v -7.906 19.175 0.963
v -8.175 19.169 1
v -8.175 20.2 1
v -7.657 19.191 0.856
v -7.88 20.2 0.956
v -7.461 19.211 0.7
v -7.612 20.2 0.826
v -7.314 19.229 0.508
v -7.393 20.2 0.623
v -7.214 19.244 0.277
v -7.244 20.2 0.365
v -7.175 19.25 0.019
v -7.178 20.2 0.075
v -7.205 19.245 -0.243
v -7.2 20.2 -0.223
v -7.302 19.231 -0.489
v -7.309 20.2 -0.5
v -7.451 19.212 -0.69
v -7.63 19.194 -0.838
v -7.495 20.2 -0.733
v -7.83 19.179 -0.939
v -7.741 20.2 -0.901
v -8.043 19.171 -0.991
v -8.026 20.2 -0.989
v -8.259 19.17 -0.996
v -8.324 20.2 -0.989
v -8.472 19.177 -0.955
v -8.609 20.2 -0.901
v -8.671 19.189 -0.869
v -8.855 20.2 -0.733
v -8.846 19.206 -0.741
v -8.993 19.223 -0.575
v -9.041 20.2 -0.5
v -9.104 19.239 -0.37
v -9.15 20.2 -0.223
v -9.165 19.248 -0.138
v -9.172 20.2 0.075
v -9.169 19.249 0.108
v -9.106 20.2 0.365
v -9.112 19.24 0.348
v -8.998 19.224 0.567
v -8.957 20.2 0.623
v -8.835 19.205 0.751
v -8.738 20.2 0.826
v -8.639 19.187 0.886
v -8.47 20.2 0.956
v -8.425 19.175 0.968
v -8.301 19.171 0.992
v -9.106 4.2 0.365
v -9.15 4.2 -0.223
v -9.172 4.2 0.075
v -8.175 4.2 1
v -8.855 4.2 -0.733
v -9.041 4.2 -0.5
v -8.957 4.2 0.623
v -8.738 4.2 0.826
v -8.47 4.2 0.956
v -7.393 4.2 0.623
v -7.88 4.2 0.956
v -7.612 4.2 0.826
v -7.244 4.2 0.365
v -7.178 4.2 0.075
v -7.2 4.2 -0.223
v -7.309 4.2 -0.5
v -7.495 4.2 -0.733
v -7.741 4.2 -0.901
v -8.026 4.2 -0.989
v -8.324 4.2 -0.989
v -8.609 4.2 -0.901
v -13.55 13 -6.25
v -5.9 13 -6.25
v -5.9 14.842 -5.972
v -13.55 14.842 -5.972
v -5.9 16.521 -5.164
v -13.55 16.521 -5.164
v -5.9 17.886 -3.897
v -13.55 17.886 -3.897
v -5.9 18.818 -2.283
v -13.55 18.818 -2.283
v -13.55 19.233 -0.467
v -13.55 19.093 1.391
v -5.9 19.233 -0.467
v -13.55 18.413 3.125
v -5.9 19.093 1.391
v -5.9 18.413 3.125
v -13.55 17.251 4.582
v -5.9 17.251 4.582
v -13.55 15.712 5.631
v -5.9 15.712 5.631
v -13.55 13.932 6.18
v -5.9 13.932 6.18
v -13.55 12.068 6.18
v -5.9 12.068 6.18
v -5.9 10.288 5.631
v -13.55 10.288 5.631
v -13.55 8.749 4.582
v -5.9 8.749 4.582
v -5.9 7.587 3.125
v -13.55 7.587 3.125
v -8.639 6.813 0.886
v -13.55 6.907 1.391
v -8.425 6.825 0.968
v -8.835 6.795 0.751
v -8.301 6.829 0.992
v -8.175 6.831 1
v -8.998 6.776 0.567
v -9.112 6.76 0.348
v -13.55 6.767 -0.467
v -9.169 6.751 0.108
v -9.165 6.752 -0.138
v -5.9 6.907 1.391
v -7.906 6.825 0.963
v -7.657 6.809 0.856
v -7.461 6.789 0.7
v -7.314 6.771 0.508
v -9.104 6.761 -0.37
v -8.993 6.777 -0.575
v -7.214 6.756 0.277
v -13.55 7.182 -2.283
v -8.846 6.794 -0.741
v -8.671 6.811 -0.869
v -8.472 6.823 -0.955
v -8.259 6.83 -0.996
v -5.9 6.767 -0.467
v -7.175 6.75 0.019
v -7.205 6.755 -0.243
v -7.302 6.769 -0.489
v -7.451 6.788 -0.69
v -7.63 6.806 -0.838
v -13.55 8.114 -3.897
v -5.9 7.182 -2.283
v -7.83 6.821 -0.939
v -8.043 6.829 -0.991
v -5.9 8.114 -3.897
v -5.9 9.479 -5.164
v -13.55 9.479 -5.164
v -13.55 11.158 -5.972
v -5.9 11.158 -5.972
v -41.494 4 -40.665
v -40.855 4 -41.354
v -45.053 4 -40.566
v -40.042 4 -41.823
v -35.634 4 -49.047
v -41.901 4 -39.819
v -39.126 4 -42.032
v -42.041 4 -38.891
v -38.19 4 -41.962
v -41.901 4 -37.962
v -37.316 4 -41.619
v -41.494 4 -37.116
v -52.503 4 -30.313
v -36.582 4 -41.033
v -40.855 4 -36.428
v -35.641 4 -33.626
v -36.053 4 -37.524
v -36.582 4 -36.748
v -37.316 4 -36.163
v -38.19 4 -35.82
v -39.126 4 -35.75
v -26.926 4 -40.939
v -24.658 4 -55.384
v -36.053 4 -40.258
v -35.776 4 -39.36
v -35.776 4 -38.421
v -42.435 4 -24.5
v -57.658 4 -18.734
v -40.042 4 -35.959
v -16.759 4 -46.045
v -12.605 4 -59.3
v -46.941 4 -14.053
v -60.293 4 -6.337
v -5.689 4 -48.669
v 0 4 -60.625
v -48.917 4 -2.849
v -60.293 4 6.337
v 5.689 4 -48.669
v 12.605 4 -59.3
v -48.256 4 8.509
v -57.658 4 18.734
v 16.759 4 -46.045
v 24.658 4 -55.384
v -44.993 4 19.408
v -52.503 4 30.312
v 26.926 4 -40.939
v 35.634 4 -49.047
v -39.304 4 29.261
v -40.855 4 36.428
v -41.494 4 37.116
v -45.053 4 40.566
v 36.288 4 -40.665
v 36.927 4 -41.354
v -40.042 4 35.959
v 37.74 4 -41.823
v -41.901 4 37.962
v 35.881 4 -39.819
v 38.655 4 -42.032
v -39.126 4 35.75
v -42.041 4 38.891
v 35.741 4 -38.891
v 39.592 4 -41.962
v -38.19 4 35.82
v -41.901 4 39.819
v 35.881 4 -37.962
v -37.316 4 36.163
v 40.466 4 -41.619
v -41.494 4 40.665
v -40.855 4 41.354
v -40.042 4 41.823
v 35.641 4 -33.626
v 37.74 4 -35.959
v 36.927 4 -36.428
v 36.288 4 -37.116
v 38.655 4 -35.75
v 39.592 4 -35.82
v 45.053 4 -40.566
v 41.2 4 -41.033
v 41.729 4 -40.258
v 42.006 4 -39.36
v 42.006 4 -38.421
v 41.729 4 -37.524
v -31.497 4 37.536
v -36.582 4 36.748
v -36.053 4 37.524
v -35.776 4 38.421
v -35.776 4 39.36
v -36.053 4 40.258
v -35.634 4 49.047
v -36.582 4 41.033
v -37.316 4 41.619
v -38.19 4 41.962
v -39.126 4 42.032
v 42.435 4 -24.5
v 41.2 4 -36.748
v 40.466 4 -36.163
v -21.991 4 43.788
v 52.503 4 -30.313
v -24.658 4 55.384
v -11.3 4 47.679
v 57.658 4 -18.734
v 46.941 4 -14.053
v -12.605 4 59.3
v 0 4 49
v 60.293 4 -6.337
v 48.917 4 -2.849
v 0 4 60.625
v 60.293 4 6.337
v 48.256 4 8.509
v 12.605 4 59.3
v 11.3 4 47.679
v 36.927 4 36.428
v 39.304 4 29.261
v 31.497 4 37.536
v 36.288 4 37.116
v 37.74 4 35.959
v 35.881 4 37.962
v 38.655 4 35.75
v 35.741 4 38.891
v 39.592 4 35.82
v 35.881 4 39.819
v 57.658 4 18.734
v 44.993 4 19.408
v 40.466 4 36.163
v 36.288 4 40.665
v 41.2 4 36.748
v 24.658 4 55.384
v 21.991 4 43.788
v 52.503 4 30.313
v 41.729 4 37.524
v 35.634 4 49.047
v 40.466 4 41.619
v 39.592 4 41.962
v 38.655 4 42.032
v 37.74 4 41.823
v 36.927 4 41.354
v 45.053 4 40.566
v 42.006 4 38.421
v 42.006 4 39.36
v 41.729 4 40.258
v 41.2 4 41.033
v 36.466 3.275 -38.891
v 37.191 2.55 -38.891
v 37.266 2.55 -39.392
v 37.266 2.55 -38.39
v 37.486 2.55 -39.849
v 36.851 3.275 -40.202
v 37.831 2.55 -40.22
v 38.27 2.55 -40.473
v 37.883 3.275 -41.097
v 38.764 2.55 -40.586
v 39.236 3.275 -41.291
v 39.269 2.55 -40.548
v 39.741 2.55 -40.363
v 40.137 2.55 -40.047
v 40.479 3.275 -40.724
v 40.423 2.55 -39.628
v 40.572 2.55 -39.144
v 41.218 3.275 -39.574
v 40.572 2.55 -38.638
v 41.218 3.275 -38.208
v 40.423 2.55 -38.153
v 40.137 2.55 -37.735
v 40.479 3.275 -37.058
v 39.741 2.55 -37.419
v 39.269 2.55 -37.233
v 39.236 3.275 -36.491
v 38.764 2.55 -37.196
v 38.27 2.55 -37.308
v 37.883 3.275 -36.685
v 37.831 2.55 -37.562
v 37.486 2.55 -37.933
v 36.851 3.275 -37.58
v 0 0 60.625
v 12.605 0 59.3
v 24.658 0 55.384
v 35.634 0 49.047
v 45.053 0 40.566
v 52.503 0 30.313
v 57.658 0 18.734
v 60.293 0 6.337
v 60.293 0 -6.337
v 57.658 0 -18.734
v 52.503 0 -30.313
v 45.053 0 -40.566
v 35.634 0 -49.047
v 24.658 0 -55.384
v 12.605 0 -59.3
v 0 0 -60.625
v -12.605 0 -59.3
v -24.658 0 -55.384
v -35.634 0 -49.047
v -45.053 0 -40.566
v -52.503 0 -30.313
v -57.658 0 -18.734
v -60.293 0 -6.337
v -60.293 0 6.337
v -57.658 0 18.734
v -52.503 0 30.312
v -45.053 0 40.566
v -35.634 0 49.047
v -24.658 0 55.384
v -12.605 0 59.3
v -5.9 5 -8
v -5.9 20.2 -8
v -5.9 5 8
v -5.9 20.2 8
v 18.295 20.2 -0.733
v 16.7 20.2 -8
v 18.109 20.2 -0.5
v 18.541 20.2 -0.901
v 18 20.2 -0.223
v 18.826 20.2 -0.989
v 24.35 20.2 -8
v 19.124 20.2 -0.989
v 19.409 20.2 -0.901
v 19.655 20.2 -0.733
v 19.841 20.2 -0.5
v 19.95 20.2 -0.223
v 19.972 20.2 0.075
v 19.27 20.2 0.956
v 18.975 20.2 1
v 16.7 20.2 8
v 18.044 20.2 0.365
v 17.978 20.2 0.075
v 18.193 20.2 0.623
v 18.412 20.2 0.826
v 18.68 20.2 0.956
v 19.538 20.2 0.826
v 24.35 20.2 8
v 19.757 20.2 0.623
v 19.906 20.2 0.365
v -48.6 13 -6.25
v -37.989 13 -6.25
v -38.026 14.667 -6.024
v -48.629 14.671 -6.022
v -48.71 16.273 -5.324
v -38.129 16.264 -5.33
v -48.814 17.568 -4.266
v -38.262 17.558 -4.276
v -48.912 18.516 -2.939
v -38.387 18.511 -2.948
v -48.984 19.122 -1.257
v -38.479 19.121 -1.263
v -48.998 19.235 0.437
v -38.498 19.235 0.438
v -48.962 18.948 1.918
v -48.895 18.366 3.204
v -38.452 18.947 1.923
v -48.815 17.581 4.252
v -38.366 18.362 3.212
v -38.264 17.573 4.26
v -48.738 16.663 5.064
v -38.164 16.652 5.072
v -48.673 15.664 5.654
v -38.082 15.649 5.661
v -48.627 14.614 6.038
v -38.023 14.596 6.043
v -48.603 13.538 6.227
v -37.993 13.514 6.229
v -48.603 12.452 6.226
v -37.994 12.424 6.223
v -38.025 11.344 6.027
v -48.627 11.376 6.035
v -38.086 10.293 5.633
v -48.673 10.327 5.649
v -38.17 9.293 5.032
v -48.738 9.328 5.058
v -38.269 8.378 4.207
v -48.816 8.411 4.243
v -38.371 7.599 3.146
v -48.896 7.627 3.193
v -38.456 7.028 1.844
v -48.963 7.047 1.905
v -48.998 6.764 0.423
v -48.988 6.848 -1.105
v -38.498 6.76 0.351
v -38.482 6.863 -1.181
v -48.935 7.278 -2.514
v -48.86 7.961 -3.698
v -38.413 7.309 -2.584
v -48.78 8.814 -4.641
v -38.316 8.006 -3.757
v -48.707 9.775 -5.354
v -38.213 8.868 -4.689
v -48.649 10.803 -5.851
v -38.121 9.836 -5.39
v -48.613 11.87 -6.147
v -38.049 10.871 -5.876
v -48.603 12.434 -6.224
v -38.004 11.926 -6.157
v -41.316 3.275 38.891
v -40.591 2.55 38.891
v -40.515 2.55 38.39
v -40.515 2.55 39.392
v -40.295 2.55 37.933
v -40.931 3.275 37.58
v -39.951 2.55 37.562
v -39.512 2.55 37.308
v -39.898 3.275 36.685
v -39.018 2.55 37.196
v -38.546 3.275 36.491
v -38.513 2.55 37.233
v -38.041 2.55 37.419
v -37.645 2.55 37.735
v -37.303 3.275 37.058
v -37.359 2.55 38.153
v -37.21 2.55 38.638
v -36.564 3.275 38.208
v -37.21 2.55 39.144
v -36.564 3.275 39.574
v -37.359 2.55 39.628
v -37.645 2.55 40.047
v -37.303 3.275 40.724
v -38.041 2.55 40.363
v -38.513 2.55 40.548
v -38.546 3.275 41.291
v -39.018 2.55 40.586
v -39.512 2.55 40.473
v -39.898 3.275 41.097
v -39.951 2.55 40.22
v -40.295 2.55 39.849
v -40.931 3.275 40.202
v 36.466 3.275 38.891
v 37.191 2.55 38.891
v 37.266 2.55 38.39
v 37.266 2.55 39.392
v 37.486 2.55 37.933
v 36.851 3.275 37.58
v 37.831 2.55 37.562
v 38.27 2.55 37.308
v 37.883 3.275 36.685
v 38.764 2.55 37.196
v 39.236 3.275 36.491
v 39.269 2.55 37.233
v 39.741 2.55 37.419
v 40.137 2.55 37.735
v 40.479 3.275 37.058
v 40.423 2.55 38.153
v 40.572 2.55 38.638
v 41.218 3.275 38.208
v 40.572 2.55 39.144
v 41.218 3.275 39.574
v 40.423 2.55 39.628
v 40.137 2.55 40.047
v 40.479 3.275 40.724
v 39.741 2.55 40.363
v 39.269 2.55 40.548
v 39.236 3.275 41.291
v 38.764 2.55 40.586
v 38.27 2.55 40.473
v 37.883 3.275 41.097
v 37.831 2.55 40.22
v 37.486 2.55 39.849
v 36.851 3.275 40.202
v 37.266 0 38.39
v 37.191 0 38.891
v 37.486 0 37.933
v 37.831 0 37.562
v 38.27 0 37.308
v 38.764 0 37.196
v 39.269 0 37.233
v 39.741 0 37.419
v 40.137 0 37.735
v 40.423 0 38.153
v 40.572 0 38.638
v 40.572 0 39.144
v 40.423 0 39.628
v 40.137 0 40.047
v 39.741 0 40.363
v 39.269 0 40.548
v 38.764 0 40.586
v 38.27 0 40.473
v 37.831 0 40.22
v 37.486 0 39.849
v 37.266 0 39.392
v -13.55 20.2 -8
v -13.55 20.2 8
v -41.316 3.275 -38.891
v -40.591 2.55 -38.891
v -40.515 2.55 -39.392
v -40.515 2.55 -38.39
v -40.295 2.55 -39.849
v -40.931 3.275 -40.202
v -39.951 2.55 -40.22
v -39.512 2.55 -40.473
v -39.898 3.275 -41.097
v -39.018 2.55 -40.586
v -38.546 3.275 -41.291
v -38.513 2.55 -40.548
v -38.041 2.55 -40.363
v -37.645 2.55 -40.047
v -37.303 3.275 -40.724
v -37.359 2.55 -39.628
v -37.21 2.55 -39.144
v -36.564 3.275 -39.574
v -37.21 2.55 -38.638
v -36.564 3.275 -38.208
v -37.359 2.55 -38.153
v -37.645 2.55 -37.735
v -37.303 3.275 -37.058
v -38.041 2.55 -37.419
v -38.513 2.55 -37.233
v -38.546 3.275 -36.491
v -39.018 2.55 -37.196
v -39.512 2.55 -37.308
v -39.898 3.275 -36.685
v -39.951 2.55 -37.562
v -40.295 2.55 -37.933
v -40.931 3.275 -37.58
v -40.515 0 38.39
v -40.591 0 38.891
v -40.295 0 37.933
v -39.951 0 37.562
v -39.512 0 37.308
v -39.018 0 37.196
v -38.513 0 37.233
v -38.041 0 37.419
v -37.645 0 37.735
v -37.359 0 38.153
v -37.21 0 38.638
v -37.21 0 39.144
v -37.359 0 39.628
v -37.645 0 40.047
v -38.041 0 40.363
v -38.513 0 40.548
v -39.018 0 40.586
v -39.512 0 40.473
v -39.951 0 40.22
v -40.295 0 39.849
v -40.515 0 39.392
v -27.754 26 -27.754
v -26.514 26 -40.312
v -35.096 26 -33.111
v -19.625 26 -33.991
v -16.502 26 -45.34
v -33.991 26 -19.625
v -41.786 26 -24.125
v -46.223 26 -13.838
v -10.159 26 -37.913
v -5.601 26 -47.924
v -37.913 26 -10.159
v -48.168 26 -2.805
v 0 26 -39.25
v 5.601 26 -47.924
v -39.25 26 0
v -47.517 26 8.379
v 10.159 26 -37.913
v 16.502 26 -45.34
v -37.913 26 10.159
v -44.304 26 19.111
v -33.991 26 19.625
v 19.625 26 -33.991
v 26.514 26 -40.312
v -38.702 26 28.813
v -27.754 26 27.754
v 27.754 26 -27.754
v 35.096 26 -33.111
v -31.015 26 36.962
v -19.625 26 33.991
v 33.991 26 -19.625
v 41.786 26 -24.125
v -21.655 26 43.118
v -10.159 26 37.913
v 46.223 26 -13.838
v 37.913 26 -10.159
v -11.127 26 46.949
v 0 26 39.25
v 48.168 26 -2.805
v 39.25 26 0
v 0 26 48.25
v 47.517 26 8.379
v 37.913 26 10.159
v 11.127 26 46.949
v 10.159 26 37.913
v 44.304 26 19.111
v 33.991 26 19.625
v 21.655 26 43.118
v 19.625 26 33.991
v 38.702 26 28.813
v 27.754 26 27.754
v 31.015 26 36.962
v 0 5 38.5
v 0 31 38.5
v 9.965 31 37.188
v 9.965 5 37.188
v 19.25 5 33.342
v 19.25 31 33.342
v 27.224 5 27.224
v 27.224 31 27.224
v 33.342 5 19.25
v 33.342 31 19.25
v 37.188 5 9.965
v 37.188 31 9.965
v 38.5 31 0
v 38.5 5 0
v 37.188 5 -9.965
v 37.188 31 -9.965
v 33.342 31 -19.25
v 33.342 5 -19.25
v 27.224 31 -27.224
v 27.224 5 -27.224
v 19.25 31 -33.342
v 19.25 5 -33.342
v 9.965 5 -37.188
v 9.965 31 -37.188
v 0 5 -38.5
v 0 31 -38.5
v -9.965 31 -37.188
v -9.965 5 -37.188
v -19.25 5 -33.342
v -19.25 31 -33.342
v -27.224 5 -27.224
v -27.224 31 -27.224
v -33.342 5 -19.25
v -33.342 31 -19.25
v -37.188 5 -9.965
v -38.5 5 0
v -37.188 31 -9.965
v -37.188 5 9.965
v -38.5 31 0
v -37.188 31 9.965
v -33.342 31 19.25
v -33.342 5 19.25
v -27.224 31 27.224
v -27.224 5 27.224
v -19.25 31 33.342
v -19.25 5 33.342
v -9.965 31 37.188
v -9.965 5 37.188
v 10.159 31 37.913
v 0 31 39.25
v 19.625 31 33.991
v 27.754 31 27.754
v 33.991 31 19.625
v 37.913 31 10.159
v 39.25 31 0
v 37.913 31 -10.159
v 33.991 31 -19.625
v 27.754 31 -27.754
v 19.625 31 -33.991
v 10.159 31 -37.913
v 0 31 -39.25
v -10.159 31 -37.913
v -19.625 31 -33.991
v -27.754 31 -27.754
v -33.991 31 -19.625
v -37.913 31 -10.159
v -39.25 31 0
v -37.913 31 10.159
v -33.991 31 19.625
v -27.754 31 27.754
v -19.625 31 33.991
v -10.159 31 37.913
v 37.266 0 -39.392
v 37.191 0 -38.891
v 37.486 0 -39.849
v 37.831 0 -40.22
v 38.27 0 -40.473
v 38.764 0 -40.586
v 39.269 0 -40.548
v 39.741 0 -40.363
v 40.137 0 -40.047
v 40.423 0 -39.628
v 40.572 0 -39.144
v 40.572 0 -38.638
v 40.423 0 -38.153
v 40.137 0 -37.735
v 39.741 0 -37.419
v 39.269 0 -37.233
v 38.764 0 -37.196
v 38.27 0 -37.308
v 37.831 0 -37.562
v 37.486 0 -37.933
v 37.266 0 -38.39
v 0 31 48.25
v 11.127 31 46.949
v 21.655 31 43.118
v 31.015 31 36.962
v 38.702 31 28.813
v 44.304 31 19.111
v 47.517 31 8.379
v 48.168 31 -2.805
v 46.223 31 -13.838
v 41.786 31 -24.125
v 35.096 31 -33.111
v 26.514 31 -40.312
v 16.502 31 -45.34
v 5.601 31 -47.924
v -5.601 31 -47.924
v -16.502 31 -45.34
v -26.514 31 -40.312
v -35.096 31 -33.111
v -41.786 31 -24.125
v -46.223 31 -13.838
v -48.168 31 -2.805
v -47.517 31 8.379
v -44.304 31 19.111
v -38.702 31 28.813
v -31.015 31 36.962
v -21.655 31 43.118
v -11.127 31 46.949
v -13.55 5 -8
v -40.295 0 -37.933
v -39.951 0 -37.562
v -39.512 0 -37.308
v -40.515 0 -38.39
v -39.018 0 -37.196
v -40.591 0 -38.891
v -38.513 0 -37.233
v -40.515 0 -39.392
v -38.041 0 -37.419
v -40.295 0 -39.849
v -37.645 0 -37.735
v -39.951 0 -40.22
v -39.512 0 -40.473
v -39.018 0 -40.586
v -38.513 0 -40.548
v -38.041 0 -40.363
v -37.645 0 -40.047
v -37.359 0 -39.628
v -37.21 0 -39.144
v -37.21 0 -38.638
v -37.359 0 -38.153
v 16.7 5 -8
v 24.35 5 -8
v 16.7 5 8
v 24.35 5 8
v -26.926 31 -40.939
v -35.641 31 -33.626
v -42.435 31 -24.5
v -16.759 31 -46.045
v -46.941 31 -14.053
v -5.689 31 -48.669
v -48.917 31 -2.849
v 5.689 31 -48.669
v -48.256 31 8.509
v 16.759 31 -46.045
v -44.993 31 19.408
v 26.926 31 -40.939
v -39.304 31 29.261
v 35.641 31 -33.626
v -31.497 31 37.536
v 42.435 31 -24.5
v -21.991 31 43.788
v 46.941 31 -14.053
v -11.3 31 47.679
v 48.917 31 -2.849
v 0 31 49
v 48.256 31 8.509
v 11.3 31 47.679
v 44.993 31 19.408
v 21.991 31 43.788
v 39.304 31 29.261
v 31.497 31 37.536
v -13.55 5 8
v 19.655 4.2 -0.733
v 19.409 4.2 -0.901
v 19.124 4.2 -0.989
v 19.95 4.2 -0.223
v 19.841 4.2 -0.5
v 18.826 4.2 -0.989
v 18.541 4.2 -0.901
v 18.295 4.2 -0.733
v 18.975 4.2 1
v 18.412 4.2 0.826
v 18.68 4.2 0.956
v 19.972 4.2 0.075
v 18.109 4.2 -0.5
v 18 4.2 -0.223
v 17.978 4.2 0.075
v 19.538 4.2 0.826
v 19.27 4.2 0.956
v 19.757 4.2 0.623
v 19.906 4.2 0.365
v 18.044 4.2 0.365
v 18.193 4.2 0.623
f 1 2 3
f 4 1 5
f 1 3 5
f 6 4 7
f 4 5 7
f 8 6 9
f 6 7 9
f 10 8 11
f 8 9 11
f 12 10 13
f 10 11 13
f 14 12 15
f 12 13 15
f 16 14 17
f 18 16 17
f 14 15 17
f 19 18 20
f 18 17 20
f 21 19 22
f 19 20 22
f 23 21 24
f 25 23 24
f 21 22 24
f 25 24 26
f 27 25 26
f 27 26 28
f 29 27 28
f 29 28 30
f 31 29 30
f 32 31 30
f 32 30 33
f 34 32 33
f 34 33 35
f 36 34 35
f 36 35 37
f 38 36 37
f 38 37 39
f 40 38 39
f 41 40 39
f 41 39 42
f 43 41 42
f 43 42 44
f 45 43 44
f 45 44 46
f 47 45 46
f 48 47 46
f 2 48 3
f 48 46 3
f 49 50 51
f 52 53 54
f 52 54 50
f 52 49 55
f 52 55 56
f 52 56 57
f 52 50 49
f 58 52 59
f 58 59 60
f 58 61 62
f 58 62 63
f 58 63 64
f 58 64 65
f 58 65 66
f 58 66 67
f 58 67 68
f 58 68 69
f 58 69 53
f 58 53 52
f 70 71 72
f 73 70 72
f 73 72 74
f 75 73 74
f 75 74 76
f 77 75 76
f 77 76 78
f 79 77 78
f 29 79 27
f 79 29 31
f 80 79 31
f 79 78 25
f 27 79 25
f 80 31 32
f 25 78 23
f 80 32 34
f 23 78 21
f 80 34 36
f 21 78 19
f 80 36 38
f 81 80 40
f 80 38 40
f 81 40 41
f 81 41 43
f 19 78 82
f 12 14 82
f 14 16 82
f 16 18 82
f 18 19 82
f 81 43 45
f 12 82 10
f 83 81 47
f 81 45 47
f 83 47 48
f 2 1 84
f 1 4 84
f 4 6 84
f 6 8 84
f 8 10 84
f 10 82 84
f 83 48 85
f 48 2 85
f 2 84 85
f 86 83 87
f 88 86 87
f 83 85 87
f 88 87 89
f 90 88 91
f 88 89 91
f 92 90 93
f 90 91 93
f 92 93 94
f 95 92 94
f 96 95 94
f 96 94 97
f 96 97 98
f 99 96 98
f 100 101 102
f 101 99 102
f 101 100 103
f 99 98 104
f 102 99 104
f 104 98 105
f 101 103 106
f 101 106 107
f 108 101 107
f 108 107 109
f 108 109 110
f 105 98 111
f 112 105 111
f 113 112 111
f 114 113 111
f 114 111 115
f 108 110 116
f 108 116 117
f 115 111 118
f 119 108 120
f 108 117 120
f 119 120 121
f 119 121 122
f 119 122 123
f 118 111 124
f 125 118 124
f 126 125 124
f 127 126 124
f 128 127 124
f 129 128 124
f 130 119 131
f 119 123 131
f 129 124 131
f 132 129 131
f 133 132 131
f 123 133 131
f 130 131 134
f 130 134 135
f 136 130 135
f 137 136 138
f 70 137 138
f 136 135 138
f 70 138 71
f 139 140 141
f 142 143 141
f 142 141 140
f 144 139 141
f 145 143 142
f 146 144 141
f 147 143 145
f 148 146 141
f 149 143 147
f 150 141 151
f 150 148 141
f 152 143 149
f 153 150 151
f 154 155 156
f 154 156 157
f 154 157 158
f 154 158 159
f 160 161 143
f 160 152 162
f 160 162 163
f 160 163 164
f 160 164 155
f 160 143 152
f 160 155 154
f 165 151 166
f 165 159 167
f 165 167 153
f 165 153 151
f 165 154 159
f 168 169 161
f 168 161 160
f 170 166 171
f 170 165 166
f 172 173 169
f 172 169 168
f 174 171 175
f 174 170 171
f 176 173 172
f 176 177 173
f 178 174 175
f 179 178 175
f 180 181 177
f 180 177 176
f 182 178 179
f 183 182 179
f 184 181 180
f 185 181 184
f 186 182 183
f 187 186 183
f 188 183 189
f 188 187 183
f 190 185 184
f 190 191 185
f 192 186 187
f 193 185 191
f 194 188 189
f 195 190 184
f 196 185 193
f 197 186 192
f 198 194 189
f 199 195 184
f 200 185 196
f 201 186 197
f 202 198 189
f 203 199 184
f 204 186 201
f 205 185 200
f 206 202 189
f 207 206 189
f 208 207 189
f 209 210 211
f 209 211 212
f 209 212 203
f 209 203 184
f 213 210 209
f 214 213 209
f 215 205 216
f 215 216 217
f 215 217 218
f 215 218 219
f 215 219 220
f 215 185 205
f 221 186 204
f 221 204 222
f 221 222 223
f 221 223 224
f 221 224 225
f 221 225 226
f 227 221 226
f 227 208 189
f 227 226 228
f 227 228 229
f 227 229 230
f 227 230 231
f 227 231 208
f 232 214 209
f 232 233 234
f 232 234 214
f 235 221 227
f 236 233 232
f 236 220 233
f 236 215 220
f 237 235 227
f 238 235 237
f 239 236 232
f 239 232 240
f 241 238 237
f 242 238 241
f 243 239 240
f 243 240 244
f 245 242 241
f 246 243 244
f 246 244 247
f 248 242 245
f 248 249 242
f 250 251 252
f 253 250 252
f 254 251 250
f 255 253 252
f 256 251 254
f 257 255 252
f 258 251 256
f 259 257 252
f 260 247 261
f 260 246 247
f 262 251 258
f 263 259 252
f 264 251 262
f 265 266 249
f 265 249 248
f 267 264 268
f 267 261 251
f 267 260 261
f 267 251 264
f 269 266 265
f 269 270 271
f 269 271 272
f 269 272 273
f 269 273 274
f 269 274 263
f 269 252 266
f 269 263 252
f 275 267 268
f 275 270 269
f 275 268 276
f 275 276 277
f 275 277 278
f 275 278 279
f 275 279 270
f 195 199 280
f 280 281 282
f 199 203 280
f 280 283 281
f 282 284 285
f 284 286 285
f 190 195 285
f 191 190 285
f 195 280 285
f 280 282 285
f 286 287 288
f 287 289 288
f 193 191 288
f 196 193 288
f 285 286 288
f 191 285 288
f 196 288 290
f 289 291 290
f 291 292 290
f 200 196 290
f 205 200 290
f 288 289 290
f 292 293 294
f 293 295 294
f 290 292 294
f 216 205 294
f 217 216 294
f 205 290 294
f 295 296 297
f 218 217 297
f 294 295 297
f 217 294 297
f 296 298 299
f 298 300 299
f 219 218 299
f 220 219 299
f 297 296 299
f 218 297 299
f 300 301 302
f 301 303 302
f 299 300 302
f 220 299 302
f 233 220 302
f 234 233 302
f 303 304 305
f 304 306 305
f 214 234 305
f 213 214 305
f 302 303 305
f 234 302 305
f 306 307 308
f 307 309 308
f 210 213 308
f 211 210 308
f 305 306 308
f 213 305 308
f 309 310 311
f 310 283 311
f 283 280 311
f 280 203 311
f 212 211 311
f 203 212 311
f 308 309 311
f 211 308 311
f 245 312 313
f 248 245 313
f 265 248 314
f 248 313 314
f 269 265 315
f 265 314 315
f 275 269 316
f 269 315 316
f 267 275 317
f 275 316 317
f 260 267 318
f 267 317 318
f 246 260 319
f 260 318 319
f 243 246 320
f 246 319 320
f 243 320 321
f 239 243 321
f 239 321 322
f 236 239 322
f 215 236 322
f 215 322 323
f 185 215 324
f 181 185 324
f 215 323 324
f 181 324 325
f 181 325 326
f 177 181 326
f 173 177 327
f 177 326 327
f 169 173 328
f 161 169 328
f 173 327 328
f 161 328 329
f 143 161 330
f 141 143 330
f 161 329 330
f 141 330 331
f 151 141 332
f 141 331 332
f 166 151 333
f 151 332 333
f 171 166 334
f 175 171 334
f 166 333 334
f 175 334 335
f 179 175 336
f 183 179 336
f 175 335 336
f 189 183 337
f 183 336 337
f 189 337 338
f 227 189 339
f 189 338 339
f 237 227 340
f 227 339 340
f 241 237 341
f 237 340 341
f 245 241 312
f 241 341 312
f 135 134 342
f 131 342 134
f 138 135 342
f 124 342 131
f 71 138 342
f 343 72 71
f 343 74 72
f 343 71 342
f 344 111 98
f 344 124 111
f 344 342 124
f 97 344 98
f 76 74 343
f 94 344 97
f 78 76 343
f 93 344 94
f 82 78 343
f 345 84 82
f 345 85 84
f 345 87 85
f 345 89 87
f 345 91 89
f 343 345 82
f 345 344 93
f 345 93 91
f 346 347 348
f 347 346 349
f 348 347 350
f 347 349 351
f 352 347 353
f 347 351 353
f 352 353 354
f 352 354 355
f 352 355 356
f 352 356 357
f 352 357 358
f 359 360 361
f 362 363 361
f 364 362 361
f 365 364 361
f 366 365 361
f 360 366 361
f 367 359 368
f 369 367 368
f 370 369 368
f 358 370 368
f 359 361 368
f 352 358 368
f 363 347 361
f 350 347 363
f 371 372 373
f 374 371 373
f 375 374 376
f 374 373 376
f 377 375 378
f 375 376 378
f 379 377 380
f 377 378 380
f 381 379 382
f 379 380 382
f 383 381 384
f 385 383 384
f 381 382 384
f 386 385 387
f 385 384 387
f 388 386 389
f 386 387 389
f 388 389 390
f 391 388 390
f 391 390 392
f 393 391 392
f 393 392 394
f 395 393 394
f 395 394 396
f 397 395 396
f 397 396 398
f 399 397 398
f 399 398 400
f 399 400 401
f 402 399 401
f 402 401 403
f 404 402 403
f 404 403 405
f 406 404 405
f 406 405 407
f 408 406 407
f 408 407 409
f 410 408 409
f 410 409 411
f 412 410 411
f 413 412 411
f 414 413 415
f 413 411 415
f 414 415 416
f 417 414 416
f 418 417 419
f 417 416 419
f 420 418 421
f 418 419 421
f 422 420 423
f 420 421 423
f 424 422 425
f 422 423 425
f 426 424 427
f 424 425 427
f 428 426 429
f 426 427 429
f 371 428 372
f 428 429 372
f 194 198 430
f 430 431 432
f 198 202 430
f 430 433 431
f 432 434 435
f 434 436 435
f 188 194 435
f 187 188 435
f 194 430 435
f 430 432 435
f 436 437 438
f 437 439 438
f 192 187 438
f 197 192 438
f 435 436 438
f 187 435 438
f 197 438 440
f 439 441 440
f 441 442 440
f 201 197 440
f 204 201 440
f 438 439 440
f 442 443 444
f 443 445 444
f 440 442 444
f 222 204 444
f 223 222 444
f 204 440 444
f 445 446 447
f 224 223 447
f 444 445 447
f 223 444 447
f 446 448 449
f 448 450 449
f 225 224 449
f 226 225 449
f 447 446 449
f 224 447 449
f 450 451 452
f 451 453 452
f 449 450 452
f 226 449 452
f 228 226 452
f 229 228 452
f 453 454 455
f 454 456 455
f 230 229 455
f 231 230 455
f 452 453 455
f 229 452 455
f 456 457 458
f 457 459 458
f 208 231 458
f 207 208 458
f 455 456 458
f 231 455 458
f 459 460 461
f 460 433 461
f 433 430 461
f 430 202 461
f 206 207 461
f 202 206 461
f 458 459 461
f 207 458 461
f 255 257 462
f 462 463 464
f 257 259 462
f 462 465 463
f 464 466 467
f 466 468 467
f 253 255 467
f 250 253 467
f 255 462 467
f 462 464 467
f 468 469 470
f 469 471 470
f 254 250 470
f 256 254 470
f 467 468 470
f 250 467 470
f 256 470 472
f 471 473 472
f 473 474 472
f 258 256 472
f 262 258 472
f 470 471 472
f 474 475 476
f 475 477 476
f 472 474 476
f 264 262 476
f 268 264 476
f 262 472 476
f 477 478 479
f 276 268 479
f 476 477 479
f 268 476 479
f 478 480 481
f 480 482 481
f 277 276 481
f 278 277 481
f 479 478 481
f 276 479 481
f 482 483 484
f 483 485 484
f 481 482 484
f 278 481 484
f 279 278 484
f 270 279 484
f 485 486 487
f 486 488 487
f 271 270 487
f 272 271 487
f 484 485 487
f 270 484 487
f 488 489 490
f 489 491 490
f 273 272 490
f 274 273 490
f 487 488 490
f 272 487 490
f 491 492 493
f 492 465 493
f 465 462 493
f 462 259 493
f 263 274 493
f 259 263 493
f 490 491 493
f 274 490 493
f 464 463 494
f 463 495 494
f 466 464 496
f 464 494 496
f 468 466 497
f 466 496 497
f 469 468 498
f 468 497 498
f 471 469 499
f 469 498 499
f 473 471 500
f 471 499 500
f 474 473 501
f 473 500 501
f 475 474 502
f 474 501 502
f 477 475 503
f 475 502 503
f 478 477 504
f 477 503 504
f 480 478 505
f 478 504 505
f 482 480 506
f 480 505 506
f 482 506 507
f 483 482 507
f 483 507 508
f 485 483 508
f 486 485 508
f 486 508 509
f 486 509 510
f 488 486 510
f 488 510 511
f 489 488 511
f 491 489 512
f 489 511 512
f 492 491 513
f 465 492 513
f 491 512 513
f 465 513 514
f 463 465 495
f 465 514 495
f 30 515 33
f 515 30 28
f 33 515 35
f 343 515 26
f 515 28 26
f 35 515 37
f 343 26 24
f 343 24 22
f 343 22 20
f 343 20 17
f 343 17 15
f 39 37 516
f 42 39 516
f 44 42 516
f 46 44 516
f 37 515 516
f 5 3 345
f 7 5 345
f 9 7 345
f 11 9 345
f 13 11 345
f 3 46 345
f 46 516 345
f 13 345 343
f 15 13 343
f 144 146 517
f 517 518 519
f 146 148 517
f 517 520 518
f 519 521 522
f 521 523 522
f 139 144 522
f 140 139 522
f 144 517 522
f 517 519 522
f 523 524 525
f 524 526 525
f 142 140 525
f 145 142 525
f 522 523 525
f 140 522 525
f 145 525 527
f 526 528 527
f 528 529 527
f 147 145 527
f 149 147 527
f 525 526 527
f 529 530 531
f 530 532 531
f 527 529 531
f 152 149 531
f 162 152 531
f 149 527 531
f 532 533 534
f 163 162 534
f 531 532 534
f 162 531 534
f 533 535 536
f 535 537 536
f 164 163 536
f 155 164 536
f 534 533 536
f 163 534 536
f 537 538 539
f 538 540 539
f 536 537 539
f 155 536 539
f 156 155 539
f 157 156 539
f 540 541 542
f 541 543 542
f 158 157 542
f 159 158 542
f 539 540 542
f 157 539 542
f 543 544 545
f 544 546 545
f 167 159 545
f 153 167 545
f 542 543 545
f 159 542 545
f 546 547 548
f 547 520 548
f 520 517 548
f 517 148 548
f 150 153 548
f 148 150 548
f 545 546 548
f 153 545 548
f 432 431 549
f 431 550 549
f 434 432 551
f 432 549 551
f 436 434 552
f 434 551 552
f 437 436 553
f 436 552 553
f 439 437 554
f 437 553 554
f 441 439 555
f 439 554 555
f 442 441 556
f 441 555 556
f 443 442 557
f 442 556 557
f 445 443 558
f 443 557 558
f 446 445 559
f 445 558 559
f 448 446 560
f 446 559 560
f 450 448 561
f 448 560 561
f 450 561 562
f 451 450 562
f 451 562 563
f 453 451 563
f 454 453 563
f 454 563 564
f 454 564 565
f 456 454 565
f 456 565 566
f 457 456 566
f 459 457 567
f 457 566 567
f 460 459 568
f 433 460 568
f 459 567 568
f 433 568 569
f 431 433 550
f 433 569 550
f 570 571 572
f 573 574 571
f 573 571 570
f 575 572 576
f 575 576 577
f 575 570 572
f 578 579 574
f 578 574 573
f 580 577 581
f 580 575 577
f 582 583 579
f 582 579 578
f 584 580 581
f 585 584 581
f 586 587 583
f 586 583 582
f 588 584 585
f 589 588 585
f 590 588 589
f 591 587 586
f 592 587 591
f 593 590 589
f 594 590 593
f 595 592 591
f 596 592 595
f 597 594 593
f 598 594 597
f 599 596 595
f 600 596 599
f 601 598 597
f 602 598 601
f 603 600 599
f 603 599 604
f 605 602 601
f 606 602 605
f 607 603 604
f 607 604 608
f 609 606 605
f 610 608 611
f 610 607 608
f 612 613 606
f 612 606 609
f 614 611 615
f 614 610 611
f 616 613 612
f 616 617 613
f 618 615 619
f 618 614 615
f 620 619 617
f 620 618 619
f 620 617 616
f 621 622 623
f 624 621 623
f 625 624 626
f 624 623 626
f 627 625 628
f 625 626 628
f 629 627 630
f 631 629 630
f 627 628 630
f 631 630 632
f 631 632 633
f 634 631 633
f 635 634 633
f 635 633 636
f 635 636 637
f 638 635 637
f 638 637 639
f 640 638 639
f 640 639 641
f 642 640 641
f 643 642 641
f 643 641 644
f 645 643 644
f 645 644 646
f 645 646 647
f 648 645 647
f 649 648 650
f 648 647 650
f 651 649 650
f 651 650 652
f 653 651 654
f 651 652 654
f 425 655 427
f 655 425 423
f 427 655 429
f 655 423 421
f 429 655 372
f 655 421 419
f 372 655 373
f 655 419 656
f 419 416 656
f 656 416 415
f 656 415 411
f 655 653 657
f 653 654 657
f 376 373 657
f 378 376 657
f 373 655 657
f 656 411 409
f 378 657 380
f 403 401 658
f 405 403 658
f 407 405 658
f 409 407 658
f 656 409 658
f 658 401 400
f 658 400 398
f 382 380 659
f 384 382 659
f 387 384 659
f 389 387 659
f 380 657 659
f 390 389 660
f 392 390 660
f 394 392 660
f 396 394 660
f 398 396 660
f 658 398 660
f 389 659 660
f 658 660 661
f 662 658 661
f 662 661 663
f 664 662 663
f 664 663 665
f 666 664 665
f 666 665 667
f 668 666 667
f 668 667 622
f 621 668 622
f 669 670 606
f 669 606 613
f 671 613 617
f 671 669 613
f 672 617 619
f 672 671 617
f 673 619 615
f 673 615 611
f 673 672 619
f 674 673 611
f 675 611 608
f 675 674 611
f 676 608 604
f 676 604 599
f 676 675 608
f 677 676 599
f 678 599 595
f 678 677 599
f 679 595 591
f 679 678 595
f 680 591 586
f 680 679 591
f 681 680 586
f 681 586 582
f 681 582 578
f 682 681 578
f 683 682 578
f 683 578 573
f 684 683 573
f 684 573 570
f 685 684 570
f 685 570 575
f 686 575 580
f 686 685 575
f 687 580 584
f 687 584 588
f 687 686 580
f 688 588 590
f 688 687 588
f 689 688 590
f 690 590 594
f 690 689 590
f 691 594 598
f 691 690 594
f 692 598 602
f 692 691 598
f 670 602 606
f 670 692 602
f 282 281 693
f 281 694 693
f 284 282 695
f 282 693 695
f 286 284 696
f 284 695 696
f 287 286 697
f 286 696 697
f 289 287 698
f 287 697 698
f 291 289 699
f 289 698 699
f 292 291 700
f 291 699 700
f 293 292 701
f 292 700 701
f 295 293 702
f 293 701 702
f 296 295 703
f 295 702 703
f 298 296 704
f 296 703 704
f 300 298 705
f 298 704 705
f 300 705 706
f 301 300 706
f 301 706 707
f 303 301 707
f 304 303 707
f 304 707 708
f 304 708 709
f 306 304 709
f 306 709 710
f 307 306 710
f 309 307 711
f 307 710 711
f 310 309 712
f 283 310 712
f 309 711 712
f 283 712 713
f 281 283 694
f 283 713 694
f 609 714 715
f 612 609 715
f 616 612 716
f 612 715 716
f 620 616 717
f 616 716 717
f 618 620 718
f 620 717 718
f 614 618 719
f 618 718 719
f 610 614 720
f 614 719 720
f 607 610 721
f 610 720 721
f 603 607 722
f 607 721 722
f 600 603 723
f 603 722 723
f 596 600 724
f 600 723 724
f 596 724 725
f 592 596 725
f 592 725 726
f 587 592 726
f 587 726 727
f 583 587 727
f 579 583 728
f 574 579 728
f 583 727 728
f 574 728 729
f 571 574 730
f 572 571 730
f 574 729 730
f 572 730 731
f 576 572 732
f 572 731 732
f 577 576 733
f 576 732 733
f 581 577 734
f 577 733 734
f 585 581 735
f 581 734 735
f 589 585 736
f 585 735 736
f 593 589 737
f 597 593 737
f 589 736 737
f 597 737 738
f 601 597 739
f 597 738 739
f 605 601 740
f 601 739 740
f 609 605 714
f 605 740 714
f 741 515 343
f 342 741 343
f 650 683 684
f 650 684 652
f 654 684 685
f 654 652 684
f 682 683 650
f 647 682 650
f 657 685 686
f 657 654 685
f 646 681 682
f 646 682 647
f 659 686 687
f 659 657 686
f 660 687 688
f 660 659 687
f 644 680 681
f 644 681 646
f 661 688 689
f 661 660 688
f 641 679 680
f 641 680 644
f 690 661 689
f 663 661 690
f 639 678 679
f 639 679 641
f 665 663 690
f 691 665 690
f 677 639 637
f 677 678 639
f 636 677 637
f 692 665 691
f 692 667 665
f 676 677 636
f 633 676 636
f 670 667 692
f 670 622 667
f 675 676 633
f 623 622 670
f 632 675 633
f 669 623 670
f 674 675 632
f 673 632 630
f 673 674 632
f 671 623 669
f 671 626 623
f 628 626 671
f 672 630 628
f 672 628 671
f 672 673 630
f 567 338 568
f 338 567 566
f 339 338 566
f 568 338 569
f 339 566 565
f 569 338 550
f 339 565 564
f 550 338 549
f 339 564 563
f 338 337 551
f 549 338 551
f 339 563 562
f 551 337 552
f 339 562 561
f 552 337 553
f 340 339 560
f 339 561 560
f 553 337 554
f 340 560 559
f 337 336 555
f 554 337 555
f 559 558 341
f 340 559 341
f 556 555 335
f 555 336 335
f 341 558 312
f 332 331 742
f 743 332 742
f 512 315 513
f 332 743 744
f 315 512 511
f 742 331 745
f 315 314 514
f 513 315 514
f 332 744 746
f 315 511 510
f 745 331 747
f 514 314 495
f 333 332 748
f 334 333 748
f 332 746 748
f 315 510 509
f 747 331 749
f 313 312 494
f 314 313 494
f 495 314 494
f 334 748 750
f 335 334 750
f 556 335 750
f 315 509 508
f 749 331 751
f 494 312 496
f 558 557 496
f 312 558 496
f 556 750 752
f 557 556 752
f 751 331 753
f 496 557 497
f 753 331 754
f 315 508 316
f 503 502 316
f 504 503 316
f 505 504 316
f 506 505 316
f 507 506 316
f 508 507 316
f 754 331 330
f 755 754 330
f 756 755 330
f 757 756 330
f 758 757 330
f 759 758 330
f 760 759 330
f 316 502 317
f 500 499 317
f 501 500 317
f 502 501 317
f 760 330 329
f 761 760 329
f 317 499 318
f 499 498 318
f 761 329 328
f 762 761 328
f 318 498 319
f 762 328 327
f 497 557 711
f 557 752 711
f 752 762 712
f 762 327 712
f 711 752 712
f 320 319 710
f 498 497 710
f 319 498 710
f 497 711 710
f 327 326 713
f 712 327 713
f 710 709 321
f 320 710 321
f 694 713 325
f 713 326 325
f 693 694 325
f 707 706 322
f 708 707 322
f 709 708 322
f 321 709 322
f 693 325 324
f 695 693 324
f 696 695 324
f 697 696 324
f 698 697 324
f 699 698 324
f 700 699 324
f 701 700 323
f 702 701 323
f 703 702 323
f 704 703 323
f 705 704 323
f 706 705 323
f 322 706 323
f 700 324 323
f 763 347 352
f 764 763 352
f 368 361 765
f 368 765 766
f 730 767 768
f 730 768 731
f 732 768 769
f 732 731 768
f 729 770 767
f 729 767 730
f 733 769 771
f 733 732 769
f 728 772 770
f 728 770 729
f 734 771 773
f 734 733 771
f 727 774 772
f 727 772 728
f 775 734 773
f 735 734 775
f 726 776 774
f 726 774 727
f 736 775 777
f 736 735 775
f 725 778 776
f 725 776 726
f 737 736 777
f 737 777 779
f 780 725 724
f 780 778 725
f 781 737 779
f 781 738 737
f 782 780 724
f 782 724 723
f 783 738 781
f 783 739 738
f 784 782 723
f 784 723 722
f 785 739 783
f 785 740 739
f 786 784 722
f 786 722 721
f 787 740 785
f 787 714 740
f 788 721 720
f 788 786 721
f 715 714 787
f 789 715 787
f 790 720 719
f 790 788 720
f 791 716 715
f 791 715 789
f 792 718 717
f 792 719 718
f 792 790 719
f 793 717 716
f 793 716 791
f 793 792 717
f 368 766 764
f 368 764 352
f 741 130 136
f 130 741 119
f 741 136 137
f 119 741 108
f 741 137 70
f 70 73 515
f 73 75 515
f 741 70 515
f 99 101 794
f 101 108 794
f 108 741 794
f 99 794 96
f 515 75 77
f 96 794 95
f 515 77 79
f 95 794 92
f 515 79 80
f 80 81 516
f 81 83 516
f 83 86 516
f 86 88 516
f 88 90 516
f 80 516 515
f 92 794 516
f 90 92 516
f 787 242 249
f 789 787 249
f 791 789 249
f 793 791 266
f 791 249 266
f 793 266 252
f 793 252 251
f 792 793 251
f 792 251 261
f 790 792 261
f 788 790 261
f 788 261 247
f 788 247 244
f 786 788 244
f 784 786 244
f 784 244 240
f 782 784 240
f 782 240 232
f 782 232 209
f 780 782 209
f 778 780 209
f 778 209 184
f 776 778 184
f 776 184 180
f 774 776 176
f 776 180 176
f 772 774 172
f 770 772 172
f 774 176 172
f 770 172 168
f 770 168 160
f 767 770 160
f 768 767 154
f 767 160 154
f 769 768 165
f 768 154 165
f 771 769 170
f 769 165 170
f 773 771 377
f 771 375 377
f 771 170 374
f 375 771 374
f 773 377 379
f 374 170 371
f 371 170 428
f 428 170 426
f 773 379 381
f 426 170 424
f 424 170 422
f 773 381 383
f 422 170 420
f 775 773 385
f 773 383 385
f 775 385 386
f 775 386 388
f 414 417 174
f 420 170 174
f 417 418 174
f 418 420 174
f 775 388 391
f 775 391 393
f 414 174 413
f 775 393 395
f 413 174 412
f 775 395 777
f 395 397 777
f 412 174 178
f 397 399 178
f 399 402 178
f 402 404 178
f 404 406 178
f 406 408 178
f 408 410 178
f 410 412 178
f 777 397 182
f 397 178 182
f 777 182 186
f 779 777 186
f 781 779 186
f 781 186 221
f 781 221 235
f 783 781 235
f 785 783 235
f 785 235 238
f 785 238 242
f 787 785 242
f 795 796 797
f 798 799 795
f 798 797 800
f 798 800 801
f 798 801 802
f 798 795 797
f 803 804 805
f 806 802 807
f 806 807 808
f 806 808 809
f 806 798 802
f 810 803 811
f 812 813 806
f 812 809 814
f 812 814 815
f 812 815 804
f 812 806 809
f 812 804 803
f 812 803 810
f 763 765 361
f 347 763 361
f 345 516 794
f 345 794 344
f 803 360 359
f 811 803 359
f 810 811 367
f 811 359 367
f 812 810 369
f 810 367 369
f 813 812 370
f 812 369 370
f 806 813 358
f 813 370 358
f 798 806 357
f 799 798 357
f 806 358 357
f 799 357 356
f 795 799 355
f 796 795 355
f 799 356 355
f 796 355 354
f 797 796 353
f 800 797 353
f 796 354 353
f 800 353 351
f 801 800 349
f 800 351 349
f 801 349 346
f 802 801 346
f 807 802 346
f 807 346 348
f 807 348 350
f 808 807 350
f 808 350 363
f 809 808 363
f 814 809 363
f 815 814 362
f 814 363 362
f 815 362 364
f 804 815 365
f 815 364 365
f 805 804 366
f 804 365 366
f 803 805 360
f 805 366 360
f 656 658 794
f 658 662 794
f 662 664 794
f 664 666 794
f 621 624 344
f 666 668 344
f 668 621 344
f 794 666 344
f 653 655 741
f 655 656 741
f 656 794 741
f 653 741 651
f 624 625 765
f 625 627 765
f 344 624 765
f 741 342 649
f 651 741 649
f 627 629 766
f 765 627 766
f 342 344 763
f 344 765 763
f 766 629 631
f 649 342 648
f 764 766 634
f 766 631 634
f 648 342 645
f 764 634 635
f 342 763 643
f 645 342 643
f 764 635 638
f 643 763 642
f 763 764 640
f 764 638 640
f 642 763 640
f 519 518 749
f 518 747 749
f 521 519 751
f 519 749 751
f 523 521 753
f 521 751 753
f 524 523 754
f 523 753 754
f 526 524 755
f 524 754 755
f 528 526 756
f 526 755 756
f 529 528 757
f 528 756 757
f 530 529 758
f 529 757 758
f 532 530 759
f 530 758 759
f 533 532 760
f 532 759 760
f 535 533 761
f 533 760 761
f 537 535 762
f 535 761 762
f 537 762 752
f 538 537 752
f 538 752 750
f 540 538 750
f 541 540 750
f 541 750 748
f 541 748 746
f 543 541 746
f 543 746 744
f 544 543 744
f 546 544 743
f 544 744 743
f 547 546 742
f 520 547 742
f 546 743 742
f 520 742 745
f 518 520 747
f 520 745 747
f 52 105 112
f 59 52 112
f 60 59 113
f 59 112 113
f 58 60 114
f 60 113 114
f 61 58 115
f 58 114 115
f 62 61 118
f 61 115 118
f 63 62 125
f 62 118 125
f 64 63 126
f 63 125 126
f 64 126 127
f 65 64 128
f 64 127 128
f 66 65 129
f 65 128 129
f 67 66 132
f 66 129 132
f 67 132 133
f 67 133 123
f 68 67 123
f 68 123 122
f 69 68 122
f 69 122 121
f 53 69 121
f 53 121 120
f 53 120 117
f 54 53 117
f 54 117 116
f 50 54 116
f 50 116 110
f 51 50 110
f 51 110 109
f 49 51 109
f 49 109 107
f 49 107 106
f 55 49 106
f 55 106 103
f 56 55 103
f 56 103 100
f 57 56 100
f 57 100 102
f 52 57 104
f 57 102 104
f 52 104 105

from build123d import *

# Parameters (mm, degrees)
SKETCH1_R                                           = 60.625
SKETCH1_R_2                                         = 45
BOSS_EXTRUDE1_DEPTH                                 = 4
SKETCH2_R                                           = 49
SKETCH2_R_2                                         = 45
BOSS_EXTRUDE2_DEPTH                                 = 27
SKETCH4_W                                           = 7.65
SKETCH4_H                                           = 16.2
BOSS_EXTRUDE4_DEPTH                                 = 8
BOSS_EXTRUDE4_2_DEPTH                               = 8
SKETCH5_R                                           = 45
BOSS_EXTRUDE5_DEPTH                                 = 5
SKETCH18_R                                          = 45.113728165
SKETCH18_R_2                                        = 38.5
BOSS_EXTRUDE6_DEPTH                                 = 31
CUT_EXTRUDE8_START                                  = -35
SKETCH11_R                                          = 6.25
CUT_EXTRUDE8_DEPTH                                  = 95.050498837
CSK_FOR_M3_COUNTERSUNK_FLAT_HEAD_SCREW1_D           = 3.4
CSK_FOR_M3_COUNTERSUNK_FLAT_HEAD_SCREW1_CSINK_D     = 6.3
CSK_FOR_M3_COUNTERSUNK_FLAT_HEAD_SCREW1_CSINK_ANGLE = 90
SKETCH27_R                                          = 1
CUT_EXTRUDE11_DEPTH                                 = 16
SKETCH28_R                                          = 48.25
SKETCH28_R_2                                        = 39.25
CUT_EXTRUDE12_DEPTH                                 = 5


with BuildPart() as part:
    # Sketch1 → Boss-Extrude1 (new body)
    with BuildSketch(Plane(origin=(0, 0, 0), x_dir=(1, 0, 0), z_dir=(0, 1, 0))):
        with Locations(Location((0, 0, 0), (0, 0, 270))):
            Circle(SKETCH1_R)
        with Locations(Location((0, 0, 0), (0, 0, 270))):
            Circle(SKETCH1_R_2, mode=Mode.SUBTRACT)
    extrude(amount=BOSS_EXTRUDE1_DEPTH)

    # Sketch2 → Boss-Extrude2 (add)
    with BuildSketch(Plane(origin=(0, 4, 0), x_dir=(1, 0, 0), z_dir=(0, 1, 0))):
        with Locations(Location((0, 0, 0), (0, 0, 270))):
            Circle(SKETCH2_R)
        with Locations(Location((0, 0, 0), (0, 0, 270))):
            Circle(SKETCH2_R_2, mode=Mode.SUBTRACT)
    extrude(amount=BOSS_EXTRUDE2_DEPTH)



with BuildPart() as body_2:
    # Sketch4 → Boss-Extrude4 (new, symmetric)
    with BuildSketch(Plane.XY):
        with Locations((-9.725, 12.1)):
            Rectangle(SKETCH4_W, SKETCH4_H)
    extrude(amount=BOSS_EXTRUDE4_DEPTH, both=True)


with BuildPart() as body_3:
    # Sketch4 → Boss-Extrude4 2 (new, symmetric)
    with BuildSketch(Plane.XY):
        with Locations((20.525, 12.1)):
            Rectangle(SKETCH4_W, SKETCH4_H)
    extrude(amount=BOSS_EXTRUDE4_2_DEPTH, both=True)


with BuildPart() as part_1:
    add(part.part)

    add(body_2.part)  # Boss-Extrude5 merges body 2

    add(body_3.part)  # Boss-Extrude5 merges body 3
    # Sketch5 → Boss-Extrude5 (add)
    with BuildSketch(Plane.XZ):
        with Locations(Location((0, 0, 0), (0, 0, 270))):
            Circle(SKETCH5_R)
    extrude(amount=-BOSS_EXTRUDE5_DEPTH)

    # Sketch18 → Boss-Extrude6 (add)
    with BuildSketch(Plane(origin=(0, 31, 0), x_dir=(1, 0, 0), z_dir=(0, 1, 0))):
        Circle(SKETCH18_R)
        with Locations(Location((0, 0, 0), (0, 0, 270))):
            Circle(SKETCH18_R_2, mode=Mode.SUBTRACT)
    extrude(amount=-BOSS_EXTRUDE6_DEPTH)

    # Sketch11 → Cut-Extrude8 (cut, through all)
    with BuildSketch(Plane(origin=(49, 0, 0), x_dir=(0, 0, -1), z_dir=(1, 0, 0)).offset(CUT_EXTRUDE8_START)):
        with Locations((0, 13)):
            Circle(SKETCH11_R)
    extrude(amount=-CUT_EXTRUDE8_DEPTH, mode=Mode.SUBTRACT)

    # CSK for M3 Countersunk Flat Head Screw1 (through all)
    with Locations(Plane(origin=(0, 4, 0), x_dir=(1, 0, 0), z_dir=(0, 1, 0))):
        with Locations((-38.890872965, 38.890872965), (-38.890872965, -38.890872965), (38.890872965, -38.890872965), (38.890872965, 38.890872965)):
            CounterSinkHole(CSK_FOR_M3_COUNTERSUNK_FLAT_HEAD_SCREW1_D / 2, CSK_FOR_M3_COUNTERSUNK_FLAT_HEAD_SCREW1_CSINK_D / 2, counter_sink_angle=CSK_FOR_M3_COUNTERSUNK_FLAT_HEAD_SCREW1_CSINK_ANGLE)

    # Sketch27 → Cut-Extrude11 (cut)
    with BuildSketch(Plane(origin=(0, 20.2, 0), x_dir=(1, 0, 0), z_dir=(0, 1, 0))):
        with Locations(Location((-8.175, 0, 0), (0, 0, 270))):
            Circle(SKETCH27_R)
        with Locations(Location((18.975, 0, 0), (0, 0, 270))):
            Circle(SKETCH27_R)
    extrude(amount=-CUT_EXTRUDE11_DEPTH, mode=Mode.SUBTRACT)

    # Sketch28 → Cut-Extrude12 (cut)
    with BuildSketch(Plane(origin=(0, 31, 0), x_dir=(1, 0, 0), z_dir=(0, 1, 0))):
        with Locations(Location((0, 0, 0), (0, 0, 270))):
            Circle(SKETCH28_R)
        with Locations(Location((0, 0, 0), (0, 0, 270))):
            Circle(SKETCH28_R_2, mode=Mode.SUBTRACT)
    extrude(amount=-CUT_EXTRUDE12_DEPTH, mode=Mode.SUBTRACT)


solid = part_1.part
